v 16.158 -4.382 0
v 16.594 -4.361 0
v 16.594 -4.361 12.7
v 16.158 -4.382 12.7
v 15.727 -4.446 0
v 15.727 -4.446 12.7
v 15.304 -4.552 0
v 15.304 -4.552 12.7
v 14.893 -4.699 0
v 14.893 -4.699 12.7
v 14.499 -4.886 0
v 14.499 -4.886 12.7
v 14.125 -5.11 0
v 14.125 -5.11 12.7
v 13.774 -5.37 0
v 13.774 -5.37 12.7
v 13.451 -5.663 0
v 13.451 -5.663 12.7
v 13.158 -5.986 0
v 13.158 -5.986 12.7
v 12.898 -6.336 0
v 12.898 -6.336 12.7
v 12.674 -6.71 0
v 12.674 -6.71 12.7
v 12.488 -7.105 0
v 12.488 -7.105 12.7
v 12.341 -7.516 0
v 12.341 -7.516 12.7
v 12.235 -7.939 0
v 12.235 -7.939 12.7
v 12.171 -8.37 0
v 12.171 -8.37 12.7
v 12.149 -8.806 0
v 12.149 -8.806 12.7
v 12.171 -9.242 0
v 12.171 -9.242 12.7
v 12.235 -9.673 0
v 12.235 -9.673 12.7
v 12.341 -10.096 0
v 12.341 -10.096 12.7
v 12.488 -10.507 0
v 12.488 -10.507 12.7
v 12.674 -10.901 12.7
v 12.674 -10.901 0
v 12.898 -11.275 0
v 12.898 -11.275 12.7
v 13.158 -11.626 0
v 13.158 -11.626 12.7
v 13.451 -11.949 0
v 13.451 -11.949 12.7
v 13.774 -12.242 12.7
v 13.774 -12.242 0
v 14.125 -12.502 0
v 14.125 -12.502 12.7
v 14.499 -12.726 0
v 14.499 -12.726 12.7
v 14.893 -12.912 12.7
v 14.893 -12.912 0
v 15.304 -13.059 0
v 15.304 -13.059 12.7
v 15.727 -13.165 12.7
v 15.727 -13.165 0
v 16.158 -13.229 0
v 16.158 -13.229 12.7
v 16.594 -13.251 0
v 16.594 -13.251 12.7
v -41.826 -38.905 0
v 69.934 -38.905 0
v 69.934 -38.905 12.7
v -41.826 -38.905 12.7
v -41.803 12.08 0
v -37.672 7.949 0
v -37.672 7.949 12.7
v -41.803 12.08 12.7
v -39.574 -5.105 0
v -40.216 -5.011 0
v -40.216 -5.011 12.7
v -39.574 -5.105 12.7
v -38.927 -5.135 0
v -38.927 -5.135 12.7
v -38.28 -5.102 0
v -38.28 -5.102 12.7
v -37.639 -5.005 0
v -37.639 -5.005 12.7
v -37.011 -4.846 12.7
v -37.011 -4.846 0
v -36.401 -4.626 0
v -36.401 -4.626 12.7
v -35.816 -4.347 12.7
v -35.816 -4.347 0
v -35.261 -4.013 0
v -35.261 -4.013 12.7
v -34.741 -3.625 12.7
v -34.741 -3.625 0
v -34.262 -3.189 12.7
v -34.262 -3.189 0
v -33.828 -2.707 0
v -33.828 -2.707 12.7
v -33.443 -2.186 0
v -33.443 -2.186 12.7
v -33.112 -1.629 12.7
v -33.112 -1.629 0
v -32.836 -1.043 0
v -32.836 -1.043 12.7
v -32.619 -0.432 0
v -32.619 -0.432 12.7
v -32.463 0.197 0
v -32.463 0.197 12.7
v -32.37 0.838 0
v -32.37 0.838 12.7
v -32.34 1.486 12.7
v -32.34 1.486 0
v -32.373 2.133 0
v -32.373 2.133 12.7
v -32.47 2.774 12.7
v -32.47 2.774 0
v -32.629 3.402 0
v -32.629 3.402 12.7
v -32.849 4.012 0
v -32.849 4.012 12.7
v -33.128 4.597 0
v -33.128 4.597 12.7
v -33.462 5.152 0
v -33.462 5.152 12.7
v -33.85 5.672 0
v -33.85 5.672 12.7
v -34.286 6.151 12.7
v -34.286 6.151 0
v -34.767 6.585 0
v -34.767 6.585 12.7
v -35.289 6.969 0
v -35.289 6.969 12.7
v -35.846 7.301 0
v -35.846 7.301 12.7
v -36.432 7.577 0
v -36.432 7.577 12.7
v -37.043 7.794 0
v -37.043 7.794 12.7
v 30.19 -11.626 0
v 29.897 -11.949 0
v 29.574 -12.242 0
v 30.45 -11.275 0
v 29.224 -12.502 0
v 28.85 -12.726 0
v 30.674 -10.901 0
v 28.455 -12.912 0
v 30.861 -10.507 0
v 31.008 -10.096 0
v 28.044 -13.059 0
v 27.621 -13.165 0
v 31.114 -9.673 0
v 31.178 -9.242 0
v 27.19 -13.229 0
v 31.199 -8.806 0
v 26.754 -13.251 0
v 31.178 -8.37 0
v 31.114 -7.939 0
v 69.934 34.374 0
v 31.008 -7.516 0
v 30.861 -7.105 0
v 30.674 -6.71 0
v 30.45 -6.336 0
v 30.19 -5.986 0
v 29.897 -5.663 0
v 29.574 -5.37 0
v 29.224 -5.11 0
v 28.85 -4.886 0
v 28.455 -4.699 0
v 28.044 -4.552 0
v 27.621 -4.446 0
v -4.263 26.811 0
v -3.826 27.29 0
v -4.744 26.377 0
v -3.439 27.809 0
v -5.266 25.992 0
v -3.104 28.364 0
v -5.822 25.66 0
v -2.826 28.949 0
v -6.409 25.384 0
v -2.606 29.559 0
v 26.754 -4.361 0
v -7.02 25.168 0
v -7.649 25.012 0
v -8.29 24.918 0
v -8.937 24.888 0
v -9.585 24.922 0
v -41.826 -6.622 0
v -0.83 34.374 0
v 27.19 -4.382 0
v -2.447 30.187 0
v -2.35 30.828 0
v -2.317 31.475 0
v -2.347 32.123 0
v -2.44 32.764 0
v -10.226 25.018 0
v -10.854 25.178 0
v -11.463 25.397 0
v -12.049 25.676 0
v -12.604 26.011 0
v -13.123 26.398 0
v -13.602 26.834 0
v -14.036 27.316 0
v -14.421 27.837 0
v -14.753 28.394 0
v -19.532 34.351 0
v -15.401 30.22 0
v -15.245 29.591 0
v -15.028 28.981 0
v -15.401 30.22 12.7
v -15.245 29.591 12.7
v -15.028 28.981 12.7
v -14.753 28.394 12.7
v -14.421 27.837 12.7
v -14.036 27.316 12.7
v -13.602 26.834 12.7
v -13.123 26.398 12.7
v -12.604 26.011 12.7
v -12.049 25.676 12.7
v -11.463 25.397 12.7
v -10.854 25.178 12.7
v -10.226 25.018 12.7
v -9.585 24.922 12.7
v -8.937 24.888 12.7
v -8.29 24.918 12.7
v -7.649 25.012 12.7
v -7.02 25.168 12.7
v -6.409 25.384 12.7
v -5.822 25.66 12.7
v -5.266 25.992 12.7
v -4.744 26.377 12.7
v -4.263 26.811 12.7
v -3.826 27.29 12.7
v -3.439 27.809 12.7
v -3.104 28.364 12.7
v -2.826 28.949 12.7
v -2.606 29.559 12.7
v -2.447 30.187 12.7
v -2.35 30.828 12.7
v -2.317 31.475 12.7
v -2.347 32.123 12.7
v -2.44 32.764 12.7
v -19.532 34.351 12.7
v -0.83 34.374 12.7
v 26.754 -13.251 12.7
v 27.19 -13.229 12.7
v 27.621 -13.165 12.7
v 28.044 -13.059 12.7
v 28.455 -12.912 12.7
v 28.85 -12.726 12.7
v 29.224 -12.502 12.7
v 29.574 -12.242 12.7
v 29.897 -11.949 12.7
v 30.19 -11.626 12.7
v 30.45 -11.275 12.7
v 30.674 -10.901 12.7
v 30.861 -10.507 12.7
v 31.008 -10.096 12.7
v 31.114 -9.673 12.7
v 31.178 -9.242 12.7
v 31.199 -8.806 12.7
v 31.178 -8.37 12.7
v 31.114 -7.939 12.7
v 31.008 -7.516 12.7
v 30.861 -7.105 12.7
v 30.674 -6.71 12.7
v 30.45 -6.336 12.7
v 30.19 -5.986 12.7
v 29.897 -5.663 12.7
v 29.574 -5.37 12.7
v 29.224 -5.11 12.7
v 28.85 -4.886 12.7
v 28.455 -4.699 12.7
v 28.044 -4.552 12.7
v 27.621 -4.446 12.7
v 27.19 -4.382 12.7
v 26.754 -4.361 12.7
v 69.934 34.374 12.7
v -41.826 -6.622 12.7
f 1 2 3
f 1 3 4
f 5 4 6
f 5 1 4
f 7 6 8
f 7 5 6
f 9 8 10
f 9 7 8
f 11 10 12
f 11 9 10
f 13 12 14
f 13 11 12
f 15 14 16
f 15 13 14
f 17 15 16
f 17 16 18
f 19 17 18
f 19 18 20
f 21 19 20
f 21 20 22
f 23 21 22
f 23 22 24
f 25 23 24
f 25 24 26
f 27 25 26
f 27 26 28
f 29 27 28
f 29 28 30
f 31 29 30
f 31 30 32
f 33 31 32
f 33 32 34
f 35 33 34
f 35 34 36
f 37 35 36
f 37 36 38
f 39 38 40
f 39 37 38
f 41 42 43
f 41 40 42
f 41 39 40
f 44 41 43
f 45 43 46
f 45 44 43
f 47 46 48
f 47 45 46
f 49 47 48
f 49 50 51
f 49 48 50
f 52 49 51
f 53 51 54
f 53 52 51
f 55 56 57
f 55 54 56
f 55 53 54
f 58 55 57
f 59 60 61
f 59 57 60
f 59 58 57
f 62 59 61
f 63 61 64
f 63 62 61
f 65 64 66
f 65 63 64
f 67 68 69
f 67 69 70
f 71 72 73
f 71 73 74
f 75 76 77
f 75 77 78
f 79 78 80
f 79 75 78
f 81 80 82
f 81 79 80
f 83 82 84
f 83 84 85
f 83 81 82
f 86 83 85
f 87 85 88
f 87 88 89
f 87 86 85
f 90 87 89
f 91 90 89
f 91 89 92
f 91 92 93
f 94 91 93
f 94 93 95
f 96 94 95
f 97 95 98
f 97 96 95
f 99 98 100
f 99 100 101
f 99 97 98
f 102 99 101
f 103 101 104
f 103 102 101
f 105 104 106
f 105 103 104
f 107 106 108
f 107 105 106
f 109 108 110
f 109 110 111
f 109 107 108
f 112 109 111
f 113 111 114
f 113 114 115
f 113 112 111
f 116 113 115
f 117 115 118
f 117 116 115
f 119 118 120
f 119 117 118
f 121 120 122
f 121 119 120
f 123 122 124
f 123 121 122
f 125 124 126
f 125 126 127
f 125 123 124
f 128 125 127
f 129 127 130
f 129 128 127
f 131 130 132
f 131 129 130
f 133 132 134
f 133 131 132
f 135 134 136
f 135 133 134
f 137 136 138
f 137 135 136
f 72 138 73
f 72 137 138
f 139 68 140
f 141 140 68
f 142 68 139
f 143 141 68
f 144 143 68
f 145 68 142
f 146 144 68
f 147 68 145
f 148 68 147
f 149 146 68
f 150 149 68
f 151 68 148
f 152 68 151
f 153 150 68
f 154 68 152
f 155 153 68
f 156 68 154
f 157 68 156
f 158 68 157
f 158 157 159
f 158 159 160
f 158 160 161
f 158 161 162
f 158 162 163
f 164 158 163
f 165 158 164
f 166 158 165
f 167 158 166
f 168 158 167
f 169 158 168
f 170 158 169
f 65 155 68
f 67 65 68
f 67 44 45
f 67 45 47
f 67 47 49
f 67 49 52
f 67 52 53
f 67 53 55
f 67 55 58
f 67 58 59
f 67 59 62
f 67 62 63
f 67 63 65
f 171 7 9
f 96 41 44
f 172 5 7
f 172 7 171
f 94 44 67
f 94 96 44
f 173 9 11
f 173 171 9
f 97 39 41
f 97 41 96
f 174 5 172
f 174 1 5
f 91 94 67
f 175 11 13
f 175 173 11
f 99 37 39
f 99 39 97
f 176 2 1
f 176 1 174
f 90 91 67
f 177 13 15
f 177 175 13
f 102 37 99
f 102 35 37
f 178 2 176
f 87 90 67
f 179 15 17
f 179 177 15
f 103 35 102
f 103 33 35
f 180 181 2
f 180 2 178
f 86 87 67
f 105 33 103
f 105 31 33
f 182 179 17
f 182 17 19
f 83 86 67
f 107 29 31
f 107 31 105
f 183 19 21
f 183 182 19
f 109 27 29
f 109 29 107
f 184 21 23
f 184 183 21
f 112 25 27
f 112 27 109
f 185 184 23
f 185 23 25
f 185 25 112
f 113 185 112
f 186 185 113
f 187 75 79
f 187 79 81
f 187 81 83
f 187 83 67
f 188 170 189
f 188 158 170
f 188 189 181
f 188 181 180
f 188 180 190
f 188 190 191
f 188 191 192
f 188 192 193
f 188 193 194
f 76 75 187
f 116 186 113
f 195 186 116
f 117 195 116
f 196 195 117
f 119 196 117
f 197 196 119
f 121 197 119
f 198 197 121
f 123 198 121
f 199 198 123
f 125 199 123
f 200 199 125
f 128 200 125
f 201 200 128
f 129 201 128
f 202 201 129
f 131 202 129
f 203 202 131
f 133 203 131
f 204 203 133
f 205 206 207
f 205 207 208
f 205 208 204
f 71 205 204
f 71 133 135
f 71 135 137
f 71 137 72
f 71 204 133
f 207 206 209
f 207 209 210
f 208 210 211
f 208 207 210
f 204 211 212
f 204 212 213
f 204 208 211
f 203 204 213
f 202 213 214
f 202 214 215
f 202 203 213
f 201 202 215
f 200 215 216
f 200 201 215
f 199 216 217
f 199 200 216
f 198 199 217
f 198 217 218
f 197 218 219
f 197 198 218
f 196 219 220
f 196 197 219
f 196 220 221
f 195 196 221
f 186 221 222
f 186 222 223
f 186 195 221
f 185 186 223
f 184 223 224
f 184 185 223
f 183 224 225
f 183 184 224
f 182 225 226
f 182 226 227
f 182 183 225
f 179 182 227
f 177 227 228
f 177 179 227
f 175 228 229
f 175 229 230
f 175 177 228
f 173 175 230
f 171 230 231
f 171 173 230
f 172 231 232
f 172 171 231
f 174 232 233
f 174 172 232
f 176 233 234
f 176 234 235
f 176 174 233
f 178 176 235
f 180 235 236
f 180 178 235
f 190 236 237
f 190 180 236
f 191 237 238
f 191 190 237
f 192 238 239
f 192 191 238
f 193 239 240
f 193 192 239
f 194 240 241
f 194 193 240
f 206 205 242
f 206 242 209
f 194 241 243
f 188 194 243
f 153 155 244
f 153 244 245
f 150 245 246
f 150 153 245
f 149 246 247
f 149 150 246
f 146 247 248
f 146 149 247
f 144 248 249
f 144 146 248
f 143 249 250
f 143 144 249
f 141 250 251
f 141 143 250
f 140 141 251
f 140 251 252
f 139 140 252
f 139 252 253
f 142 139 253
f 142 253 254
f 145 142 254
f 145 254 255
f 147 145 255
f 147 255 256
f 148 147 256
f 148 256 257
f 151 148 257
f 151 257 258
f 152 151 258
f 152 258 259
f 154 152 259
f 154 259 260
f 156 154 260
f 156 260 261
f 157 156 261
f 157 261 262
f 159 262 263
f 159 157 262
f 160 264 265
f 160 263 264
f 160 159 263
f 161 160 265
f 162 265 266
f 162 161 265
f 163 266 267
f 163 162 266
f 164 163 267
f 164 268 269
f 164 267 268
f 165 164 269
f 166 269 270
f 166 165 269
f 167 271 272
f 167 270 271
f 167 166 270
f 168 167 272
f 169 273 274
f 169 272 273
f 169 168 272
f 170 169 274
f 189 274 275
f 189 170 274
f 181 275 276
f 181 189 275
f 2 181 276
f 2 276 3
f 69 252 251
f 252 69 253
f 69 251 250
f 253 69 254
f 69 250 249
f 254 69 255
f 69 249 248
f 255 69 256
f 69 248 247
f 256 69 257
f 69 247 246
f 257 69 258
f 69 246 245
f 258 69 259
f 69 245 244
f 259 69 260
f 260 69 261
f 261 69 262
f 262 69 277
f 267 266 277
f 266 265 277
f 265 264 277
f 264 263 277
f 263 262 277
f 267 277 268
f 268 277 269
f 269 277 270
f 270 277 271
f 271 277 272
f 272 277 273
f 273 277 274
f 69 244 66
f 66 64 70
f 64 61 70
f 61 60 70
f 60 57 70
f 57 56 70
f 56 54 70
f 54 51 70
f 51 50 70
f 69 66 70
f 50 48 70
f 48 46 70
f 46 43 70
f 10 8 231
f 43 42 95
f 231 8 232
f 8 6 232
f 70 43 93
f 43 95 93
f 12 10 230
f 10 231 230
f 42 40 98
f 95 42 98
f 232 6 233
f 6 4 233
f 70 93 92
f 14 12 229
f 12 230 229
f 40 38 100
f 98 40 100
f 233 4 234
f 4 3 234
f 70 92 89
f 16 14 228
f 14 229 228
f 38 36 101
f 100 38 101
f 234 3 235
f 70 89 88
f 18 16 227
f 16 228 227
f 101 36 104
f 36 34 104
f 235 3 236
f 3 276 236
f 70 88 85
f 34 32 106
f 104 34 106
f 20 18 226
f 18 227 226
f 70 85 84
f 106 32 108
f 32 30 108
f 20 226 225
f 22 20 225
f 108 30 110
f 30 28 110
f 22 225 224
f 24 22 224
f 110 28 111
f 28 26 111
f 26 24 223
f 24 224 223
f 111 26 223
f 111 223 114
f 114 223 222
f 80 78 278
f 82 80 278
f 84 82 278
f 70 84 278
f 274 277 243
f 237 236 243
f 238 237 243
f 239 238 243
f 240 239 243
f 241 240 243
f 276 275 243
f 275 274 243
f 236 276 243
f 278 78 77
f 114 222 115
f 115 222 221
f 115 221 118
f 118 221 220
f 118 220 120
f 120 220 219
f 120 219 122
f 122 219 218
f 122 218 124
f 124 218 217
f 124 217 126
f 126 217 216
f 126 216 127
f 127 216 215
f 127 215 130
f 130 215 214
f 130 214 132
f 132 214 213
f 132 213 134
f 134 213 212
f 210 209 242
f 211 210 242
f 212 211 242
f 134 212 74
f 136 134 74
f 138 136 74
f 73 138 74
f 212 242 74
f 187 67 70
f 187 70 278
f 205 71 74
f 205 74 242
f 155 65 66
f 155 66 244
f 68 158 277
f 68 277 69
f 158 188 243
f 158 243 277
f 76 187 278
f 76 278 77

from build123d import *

# Parameters (mm, degrees)
BOSS_EXTRUDE1_DEPTH = 12.7
CUT_EXTRUDE1_DEPTH  = 82.028788994


with BuildPart() as part:
    # Sketch1 → Boss-Extrude1 (new body)
    with BuildSketch(Plane.XY):
        with BuildLine():
            Line((-0.830126662, 34.37418152), (69.93418152, 34.37418152))
            Line((69.93418152, 34.37418152), (69.93418152, -38.90481848))
            Line((69.93418152, -38.90481848), (-41.82581848, -38.90481848))
            Line((-41.82581848, -38.90481848), (-41.82581848, -6.621510298))
            Line((-41.82581848, -6.621510298), (-40.215693332, -5.01138515))
            ThreePointArc((-40.215693332, -5.01138515), (-32.463490161, 0.197163401), (-37.672038711, 7.949366571))
            Line((-37.672038711, 7.949366571), (-41.802956527, 12.080284387))
            Line((-41.802956527, 12.080284387), (-19.531921346, 34.351319567))
            Line((-19.531921346, 34.351319567), (-15.401003531, 30.220401752))
            ThreePointArc((-15.401003531, 30.220401752), (-7.64880036, 25.011853201), (-2.44025181, 32.764056372))
            Line((-2.44025181, 32.764056372), (-0.830126662, 34.37418152))
        make_face()
    extrude(amount=BOSS_EXTRUDE1_DEPTH)

    # Sketch2 → Cut-Extrude1 (cut, through all)
    with BuildSketch(Plane(origin=(0, 0, 0), x_dir=(-1, 0, 0), z_dir=(0, 0, -1))):
        with BuildLine():
            Line((-26.75418152, -4.36081848), (-16.59418152, -4.36081848))
            ThreePointArc((-16.59418152, -4.36081848), (-12.14918152, -8.80581848), (-16.59418152, -13.25081848))
            Line((-16.59418152, -13.25081848), (-26.75418152, -13.25081848))
            ThreePointArc((-26.75418152, -13.25081848), (-31.19918152, -8.80581848), (-26.75418152, -4.36081848))
        make_face()
    extrude(amount=-CUT_EXTRUDE1_DEPTH, mode=Mode.SUBTRACT)


solid = part.part
